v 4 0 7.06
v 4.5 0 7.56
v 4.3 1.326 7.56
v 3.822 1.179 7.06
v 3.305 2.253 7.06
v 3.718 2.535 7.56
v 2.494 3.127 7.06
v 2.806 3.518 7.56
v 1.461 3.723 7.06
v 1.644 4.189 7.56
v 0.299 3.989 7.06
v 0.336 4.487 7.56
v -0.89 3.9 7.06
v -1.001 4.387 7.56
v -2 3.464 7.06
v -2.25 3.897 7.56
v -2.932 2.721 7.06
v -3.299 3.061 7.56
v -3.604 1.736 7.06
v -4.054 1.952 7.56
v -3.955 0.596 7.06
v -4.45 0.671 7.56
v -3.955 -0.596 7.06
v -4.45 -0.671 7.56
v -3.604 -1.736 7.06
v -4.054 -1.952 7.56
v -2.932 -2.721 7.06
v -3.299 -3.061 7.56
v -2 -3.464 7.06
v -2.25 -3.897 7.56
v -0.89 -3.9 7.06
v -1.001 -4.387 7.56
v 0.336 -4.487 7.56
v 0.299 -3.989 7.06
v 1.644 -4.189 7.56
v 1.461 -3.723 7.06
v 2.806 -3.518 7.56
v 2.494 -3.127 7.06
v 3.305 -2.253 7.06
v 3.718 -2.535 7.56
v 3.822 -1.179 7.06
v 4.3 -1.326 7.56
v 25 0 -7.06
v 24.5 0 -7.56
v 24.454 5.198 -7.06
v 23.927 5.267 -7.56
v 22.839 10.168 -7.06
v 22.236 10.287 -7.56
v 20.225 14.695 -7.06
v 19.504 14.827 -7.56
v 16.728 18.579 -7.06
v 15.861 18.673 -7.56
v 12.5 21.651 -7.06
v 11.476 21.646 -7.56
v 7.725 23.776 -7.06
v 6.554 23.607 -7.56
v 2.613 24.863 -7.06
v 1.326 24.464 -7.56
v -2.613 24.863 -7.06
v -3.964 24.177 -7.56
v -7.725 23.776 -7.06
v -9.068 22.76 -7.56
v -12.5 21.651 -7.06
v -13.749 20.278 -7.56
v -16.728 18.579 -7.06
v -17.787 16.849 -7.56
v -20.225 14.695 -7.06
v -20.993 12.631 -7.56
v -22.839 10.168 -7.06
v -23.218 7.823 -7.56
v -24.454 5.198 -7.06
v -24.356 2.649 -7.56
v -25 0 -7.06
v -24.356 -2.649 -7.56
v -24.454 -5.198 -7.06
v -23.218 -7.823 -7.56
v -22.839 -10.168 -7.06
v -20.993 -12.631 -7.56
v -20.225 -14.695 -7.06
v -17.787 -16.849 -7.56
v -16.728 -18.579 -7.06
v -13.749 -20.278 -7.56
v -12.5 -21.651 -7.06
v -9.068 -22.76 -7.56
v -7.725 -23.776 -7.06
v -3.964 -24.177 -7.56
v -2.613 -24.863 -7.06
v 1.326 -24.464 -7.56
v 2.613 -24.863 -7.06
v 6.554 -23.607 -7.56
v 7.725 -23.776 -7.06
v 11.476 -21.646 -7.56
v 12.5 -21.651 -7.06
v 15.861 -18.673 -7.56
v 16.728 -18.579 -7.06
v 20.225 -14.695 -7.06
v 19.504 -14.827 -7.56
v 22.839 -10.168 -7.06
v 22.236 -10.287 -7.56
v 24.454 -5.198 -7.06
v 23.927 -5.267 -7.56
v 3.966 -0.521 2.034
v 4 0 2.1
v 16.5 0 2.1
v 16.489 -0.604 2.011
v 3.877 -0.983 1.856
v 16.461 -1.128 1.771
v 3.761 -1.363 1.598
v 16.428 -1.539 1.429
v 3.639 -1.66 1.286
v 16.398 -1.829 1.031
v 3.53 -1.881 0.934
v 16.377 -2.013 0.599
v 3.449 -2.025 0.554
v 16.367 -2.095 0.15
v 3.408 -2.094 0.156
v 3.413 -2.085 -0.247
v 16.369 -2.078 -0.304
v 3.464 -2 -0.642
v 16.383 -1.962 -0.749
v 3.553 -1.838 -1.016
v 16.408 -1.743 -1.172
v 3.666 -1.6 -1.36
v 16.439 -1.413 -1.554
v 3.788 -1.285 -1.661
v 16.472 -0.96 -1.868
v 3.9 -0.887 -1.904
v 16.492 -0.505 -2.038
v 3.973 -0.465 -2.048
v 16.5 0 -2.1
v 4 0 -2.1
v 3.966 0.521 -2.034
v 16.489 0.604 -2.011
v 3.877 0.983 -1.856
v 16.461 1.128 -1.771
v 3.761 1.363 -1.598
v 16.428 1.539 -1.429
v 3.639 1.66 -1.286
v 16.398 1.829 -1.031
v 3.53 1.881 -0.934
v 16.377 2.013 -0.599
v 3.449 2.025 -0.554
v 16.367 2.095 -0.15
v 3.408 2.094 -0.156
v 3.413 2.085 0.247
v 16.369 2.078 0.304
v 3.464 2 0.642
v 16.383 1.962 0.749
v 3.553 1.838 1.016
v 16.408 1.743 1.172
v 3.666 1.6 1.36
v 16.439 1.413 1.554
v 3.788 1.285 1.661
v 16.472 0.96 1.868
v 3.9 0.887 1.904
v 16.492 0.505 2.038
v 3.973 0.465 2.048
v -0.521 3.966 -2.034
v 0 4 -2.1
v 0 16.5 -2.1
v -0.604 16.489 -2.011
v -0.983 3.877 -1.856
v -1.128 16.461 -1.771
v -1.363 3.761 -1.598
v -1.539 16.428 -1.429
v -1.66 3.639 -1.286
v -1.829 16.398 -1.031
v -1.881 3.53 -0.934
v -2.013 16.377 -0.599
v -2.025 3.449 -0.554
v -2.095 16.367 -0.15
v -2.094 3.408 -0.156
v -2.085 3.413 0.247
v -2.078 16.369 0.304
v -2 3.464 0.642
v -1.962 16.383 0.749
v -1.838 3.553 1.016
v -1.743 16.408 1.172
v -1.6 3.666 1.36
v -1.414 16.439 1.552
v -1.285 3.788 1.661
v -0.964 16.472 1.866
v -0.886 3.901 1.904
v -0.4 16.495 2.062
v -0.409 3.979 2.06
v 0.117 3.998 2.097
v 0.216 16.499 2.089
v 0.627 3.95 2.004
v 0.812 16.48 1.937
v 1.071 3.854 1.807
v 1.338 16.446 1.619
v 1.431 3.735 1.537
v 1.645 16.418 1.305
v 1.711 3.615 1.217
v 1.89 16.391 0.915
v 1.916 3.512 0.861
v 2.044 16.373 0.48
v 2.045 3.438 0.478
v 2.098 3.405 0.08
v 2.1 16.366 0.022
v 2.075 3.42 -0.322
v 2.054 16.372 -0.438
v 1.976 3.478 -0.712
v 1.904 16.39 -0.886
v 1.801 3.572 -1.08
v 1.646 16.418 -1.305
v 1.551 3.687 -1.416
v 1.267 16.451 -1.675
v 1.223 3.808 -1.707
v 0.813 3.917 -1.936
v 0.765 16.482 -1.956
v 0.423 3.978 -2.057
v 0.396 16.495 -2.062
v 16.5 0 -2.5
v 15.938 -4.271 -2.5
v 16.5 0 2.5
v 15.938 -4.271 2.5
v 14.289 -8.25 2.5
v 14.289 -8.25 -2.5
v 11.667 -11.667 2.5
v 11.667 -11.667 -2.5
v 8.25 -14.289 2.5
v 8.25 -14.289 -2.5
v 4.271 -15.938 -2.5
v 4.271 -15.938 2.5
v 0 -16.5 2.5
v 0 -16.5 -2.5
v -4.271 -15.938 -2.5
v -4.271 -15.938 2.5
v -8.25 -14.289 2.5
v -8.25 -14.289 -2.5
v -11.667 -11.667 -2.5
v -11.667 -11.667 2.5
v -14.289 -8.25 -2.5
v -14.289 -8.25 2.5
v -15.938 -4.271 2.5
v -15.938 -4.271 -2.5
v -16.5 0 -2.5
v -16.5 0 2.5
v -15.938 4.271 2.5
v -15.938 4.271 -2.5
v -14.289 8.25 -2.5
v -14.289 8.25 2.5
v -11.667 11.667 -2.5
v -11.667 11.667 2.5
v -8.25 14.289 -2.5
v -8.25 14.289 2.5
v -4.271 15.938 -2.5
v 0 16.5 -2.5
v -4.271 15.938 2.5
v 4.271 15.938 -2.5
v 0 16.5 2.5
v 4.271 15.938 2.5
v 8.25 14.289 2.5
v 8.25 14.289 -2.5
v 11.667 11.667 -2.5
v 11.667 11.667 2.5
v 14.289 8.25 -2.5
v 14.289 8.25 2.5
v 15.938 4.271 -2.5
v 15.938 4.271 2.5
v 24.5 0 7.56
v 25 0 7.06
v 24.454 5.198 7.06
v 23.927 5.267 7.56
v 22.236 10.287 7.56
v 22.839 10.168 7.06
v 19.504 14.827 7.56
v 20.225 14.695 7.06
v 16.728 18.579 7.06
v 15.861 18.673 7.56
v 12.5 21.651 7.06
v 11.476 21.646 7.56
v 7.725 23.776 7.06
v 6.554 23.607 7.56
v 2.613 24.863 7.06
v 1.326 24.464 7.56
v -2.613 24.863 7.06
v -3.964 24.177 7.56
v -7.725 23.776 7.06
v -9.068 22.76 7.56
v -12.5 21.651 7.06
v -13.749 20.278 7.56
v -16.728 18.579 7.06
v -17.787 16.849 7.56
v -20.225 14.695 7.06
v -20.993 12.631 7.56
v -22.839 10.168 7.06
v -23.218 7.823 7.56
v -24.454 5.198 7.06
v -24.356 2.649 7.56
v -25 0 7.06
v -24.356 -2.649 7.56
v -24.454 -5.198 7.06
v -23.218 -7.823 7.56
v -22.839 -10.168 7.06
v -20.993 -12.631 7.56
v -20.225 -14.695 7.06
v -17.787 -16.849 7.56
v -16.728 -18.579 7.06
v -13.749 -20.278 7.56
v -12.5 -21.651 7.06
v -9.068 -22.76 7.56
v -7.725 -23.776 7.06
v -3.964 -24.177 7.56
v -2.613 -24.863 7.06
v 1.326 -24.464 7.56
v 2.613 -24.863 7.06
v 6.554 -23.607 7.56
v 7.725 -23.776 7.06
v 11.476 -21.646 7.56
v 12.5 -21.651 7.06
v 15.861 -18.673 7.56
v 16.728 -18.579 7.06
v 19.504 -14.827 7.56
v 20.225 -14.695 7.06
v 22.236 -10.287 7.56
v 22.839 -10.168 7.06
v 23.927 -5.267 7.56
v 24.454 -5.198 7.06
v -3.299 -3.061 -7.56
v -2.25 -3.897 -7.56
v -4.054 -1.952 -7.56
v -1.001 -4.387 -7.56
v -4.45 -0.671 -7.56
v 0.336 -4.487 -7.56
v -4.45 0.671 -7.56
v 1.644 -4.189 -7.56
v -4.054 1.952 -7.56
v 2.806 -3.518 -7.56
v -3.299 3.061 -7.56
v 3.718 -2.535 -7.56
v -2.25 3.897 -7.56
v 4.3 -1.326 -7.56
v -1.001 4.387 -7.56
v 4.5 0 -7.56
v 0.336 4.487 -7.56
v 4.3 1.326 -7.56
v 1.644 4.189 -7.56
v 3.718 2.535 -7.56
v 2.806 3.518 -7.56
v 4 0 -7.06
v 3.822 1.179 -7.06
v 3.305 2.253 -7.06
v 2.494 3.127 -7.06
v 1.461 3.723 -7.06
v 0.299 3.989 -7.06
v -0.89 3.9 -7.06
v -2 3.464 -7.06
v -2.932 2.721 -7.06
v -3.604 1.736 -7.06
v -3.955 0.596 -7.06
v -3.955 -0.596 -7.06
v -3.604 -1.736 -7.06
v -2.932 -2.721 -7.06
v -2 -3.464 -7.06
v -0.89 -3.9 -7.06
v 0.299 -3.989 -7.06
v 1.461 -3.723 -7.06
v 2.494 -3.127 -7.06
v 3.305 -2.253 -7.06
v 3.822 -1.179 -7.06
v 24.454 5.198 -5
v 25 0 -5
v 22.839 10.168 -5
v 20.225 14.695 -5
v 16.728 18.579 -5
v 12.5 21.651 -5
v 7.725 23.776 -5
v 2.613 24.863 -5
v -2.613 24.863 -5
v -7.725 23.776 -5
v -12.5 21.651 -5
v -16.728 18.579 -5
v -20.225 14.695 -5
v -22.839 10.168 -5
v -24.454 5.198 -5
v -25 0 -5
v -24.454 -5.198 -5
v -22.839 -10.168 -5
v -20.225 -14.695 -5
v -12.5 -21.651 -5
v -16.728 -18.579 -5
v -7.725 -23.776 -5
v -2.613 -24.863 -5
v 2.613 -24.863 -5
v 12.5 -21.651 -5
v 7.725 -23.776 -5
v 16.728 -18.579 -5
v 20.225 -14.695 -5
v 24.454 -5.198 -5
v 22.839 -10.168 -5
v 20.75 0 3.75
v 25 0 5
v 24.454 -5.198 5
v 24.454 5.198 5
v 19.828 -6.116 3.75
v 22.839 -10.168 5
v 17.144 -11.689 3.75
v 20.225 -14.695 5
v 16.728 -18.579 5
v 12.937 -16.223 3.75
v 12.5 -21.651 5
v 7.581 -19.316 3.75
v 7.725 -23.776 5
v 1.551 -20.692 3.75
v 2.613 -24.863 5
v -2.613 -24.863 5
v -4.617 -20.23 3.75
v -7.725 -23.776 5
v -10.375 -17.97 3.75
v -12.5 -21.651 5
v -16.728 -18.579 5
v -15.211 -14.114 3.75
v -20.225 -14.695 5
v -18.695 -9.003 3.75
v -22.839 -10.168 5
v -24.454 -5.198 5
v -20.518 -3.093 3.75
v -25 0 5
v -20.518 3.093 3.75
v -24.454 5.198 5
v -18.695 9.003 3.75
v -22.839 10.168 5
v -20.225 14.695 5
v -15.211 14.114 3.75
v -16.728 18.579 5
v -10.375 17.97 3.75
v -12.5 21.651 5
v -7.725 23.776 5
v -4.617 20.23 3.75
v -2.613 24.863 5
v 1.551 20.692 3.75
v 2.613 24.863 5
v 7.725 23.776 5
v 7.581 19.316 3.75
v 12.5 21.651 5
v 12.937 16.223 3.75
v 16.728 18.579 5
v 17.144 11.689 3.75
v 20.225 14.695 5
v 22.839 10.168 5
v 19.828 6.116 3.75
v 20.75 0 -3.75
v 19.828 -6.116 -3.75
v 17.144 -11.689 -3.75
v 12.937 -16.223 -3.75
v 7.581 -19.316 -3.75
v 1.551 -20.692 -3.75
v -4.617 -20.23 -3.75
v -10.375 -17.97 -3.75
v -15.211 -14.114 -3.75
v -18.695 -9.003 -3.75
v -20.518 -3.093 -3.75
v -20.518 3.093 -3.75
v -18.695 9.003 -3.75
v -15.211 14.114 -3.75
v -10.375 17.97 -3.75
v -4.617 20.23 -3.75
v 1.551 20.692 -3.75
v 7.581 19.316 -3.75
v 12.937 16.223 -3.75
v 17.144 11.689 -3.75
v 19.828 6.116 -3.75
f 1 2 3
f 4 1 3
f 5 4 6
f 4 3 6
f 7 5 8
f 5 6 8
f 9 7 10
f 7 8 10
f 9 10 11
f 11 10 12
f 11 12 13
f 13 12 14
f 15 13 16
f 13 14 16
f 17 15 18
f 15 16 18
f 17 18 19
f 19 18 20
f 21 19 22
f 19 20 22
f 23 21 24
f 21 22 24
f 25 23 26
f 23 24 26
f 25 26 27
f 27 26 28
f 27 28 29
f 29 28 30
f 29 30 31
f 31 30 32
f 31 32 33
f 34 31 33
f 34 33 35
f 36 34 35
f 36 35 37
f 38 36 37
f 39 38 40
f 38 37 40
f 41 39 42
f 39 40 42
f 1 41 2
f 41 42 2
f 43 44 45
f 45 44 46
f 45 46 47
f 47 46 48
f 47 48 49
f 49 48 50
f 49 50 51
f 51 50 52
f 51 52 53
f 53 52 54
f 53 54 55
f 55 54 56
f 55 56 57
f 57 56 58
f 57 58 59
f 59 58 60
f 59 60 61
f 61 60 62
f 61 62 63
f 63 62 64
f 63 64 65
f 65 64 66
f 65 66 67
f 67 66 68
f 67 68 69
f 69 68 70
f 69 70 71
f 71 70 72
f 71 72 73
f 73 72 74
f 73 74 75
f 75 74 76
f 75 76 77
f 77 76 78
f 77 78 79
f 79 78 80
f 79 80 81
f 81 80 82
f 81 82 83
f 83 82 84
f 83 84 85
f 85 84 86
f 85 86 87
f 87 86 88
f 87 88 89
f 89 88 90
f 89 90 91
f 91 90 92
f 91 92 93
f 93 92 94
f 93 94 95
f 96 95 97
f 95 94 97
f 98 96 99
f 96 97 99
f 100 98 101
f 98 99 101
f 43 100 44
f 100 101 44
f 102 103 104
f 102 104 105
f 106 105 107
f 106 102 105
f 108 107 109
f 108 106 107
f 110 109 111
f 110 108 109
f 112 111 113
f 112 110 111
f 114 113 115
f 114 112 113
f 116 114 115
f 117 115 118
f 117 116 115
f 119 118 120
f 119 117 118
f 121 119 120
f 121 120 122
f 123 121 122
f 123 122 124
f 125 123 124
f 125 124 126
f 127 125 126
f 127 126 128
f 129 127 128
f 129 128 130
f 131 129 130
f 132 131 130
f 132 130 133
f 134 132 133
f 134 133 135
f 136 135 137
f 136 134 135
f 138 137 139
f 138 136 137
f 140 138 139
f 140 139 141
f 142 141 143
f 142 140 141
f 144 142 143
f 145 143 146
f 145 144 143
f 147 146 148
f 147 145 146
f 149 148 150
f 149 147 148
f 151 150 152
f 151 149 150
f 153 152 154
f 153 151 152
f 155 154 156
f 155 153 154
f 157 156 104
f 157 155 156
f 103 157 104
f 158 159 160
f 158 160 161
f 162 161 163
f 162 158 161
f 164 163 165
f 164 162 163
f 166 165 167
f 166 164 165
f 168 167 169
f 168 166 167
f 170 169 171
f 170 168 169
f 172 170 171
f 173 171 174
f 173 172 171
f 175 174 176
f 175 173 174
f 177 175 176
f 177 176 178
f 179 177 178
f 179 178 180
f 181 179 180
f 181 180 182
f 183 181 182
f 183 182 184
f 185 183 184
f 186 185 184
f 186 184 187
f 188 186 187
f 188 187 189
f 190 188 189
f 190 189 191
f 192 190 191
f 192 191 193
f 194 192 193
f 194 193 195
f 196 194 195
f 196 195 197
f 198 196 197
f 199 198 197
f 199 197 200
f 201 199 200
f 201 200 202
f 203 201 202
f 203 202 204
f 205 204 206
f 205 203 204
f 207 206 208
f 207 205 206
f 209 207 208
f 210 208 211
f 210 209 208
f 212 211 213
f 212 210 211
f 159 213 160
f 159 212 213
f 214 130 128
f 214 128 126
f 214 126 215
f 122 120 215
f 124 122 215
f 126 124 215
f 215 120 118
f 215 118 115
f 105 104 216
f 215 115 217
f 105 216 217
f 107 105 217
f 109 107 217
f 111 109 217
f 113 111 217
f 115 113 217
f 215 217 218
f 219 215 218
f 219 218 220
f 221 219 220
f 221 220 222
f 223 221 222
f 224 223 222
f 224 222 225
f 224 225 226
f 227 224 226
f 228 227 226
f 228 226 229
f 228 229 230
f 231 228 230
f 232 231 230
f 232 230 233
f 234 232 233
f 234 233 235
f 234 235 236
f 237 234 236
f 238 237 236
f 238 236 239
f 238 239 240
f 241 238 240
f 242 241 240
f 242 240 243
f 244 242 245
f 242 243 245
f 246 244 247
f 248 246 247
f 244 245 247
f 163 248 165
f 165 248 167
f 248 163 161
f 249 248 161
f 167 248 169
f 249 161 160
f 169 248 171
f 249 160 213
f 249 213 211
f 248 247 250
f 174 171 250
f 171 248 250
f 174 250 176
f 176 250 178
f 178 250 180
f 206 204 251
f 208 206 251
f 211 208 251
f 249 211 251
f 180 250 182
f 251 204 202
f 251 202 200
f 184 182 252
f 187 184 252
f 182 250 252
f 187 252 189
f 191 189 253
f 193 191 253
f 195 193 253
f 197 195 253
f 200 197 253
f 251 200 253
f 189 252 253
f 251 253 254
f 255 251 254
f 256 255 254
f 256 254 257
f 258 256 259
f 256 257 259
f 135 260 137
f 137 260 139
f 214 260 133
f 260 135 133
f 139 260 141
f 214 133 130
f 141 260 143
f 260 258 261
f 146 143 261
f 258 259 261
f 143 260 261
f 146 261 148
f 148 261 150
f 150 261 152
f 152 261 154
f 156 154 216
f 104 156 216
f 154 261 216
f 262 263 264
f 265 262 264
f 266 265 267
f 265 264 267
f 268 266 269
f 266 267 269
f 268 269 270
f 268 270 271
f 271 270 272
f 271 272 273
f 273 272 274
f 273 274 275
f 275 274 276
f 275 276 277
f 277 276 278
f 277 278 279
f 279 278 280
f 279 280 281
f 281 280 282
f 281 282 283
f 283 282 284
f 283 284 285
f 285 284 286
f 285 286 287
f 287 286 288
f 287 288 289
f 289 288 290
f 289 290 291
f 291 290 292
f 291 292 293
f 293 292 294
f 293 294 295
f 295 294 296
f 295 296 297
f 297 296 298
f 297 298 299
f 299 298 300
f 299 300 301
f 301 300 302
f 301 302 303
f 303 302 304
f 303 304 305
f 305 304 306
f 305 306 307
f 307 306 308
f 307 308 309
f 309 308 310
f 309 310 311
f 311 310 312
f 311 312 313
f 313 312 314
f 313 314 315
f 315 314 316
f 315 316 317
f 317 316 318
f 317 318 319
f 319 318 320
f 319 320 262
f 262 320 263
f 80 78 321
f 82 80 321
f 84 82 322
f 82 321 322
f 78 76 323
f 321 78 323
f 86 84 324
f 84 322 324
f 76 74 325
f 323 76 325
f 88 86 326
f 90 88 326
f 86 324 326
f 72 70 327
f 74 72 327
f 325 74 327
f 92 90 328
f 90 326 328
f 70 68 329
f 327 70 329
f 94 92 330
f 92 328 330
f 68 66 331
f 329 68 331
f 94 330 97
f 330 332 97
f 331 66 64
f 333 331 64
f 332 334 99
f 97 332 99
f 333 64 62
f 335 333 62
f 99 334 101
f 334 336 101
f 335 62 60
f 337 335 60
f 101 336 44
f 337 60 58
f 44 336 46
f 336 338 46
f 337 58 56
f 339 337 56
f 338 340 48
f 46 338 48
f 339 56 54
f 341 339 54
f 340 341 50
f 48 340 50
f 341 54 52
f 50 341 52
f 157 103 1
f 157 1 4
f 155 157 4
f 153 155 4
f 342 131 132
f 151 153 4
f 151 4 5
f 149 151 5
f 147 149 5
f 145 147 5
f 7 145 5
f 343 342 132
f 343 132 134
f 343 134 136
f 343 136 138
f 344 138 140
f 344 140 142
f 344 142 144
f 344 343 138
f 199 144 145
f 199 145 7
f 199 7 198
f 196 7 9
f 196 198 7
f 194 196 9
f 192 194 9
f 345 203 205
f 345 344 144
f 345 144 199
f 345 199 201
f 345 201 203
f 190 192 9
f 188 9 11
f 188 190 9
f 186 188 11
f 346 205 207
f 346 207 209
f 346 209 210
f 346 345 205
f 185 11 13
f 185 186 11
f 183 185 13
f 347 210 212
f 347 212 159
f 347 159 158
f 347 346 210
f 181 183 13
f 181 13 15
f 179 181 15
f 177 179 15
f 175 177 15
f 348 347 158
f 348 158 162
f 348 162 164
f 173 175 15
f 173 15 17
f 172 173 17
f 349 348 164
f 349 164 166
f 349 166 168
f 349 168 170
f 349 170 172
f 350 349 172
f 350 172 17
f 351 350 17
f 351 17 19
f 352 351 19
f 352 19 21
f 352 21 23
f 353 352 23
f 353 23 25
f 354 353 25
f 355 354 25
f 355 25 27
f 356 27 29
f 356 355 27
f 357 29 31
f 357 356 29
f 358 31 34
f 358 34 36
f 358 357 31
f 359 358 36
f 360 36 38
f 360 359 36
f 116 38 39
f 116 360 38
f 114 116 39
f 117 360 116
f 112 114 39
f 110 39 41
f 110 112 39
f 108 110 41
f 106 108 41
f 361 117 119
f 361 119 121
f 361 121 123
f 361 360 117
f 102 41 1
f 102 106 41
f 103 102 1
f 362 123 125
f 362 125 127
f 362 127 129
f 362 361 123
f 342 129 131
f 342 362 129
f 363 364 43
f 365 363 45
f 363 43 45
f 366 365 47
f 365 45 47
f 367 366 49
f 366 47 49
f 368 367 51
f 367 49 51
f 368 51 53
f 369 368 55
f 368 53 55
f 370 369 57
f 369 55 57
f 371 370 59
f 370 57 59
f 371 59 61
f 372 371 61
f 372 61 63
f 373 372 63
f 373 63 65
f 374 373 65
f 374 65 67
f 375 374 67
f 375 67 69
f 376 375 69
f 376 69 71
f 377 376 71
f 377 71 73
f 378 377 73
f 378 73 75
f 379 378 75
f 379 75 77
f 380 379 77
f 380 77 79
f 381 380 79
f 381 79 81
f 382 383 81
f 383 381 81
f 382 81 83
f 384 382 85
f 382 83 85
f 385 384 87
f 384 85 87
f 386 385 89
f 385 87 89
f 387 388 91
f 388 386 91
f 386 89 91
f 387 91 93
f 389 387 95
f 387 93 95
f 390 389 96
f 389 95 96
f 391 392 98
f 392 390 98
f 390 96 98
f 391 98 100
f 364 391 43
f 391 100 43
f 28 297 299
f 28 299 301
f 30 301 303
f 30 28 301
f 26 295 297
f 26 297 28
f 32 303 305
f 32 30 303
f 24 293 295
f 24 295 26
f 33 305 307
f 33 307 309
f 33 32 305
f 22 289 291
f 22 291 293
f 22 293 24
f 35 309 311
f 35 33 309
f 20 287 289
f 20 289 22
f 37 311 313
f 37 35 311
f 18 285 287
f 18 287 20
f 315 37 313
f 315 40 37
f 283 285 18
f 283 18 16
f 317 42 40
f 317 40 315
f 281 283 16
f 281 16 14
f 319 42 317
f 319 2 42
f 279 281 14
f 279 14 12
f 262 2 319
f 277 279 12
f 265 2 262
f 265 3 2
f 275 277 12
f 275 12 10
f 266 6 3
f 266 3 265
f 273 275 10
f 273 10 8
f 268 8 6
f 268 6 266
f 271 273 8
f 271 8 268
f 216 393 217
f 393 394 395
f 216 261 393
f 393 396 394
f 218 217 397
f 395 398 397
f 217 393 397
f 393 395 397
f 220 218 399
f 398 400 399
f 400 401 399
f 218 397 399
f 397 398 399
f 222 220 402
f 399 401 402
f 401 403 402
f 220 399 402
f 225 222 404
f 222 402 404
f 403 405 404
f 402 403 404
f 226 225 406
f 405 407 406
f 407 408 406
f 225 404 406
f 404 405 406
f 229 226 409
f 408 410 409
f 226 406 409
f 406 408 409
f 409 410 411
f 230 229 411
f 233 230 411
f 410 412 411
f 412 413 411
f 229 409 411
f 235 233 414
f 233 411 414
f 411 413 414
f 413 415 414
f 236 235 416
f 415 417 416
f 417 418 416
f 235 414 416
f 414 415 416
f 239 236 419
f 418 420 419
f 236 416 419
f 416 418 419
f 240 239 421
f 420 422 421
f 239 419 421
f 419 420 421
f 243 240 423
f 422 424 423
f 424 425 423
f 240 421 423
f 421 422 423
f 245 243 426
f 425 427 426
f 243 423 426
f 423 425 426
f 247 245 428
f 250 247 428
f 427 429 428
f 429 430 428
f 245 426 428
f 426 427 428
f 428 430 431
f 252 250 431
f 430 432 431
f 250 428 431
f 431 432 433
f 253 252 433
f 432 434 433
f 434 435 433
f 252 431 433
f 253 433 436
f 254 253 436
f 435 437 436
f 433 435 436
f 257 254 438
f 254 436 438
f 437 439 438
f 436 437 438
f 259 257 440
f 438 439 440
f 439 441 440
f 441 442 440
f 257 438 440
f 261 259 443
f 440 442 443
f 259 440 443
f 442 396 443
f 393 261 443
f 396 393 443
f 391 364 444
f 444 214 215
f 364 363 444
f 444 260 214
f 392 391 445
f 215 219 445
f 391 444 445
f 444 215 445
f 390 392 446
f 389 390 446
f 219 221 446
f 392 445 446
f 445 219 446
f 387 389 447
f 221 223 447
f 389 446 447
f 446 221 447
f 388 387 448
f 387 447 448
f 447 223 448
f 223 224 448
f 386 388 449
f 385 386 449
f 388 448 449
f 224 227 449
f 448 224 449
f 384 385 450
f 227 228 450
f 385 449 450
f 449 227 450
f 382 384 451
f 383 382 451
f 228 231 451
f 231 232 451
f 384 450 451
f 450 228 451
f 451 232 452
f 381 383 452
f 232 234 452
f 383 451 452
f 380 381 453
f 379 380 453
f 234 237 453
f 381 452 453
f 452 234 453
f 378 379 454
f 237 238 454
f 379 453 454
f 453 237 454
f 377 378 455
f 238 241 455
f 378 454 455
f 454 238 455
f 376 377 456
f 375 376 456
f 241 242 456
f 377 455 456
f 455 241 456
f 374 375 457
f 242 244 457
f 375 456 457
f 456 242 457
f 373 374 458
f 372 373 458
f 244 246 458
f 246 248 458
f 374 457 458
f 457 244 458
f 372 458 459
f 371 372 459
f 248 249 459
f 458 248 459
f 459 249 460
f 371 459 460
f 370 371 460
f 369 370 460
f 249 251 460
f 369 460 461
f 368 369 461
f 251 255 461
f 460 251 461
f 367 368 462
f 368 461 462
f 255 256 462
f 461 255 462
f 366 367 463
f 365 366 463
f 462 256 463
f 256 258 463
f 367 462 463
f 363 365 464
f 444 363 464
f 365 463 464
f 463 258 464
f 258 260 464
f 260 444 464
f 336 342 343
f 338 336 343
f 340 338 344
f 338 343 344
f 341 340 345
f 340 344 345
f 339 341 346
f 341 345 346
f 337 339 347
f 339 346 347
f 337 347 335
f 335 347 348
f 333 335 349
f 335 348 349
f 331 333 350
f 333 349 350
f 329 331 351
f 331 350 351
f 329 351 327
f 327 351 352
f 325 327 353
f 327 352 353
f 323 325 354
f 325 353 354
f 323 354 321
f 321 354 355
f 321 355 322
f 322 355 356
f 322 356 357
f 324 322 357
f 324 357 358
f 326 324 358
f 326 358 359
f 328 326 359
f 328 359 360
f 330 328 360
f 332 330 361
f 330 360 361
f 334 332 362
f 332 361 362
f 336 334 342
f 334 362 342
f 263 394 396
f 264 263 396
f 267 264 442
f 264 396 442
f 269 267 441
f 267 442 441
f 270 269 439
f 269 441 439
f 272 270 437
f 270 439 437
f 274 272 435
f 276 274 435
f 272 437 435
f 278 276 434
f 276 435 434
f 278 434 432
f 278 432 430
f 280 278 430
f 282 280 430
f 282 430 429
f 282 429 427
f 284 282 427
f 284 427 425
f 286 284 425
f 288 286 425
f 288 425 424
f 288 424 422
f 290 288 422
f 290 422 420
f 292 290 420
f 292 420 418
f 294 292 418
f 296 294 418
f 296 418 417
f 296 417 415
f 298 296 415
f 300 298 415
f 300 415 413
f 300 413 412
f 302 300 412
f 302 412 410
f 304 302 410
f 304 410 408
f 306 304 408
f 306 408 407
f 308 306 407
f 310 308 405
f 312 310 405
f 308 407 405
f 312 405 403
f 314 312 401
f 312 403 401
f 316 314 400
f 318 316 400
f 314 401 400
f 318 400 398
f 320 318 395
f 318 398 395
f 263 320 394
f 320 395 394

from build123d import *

# Parameters (mm, degrees)
EXTRUDE_1_DEPTH      = 7.56
EXTRUDE_1_DEPTH_BACK = 7.56
SKETCH_1_R           = 25
SKETCH_1_R_2         = 4
SKETCH_4_R           = 2.1
CUT_EXTRUDE_1_DEPTH  = 37.15457924
SKETCH_5_R           = 2.1
CUT_EXTRUDE_2_DEPTH  = 37.154579261
CHAMFER_1_SIZE       = 0.5


with BuildPart() as part:
    # 草图1 → 凸台-拉伸1 (new, two sides: drawn at the far end of the back side and taken through both)
    with BuildSketch(Plane.XY.offset(-EXTRUDE_1_DEPTH_BACK)):
        Circle(SKETCH_1_R)
        Circle(SKETCH_1_R_2, mode=Mode.SUBTRACT)
    extrude(amount=EXTRUDE_1_DEPTH + EXTRUDE_1_DEPTH_BACK)

    # 草图3 → 切除-旋转2 (revolve, cut)
    with BuildSketch(Plane(origin=(0, 0, 0), x_dir=(0, 0, -1), z_dir=(1, 0, 0))):
        Polygon((-5, 25), (5, 25), (2.5, 16.5), (-2.5, 16.5), align=None)
    revolve(axis=Axis((0, 0, 7.56), (0, 0, -1)), mode=Mode.SUBTRACT)

    # 草图4 → 切除-拉伸1 (cut, through all)
    with BuildSketch(Plane(origin=(0, 0, 0), x_dir=(1, 0, 0), z_dir=(0, 1, 0))):
        Circle(SKETCH_4_R)
    extrude(amount=CUT_EXTRUDE_1_DEPTH, mode=Mode.SUBTRACT)

    # 草图5 → 切除-拉伸2 (cut, through all)
    with BuildSketch(Plane(origin=(0, 0, 0), x_dir=(0, 0, -1), z_dir=(1, 0, 0))):
        Circle(SKETCH_5_R)
    extrude(amount=CUT_EXTRUDE_2_DEPTH, mode=Mode.SUBTRACT)

    # 倒角1
    chamfer_1_edges = [part.edges().sort_by_distance(p)[0] for p in [
        (-4, 0, 7.56),
        (-4, 0, -7.56),
        (-25, 0, -7.56),
        (-25, 0, 7.56),
    ]]
    chamfer(chamfer_1_edges, length=CHAMFER_1_SIZE)


solid = part.part
